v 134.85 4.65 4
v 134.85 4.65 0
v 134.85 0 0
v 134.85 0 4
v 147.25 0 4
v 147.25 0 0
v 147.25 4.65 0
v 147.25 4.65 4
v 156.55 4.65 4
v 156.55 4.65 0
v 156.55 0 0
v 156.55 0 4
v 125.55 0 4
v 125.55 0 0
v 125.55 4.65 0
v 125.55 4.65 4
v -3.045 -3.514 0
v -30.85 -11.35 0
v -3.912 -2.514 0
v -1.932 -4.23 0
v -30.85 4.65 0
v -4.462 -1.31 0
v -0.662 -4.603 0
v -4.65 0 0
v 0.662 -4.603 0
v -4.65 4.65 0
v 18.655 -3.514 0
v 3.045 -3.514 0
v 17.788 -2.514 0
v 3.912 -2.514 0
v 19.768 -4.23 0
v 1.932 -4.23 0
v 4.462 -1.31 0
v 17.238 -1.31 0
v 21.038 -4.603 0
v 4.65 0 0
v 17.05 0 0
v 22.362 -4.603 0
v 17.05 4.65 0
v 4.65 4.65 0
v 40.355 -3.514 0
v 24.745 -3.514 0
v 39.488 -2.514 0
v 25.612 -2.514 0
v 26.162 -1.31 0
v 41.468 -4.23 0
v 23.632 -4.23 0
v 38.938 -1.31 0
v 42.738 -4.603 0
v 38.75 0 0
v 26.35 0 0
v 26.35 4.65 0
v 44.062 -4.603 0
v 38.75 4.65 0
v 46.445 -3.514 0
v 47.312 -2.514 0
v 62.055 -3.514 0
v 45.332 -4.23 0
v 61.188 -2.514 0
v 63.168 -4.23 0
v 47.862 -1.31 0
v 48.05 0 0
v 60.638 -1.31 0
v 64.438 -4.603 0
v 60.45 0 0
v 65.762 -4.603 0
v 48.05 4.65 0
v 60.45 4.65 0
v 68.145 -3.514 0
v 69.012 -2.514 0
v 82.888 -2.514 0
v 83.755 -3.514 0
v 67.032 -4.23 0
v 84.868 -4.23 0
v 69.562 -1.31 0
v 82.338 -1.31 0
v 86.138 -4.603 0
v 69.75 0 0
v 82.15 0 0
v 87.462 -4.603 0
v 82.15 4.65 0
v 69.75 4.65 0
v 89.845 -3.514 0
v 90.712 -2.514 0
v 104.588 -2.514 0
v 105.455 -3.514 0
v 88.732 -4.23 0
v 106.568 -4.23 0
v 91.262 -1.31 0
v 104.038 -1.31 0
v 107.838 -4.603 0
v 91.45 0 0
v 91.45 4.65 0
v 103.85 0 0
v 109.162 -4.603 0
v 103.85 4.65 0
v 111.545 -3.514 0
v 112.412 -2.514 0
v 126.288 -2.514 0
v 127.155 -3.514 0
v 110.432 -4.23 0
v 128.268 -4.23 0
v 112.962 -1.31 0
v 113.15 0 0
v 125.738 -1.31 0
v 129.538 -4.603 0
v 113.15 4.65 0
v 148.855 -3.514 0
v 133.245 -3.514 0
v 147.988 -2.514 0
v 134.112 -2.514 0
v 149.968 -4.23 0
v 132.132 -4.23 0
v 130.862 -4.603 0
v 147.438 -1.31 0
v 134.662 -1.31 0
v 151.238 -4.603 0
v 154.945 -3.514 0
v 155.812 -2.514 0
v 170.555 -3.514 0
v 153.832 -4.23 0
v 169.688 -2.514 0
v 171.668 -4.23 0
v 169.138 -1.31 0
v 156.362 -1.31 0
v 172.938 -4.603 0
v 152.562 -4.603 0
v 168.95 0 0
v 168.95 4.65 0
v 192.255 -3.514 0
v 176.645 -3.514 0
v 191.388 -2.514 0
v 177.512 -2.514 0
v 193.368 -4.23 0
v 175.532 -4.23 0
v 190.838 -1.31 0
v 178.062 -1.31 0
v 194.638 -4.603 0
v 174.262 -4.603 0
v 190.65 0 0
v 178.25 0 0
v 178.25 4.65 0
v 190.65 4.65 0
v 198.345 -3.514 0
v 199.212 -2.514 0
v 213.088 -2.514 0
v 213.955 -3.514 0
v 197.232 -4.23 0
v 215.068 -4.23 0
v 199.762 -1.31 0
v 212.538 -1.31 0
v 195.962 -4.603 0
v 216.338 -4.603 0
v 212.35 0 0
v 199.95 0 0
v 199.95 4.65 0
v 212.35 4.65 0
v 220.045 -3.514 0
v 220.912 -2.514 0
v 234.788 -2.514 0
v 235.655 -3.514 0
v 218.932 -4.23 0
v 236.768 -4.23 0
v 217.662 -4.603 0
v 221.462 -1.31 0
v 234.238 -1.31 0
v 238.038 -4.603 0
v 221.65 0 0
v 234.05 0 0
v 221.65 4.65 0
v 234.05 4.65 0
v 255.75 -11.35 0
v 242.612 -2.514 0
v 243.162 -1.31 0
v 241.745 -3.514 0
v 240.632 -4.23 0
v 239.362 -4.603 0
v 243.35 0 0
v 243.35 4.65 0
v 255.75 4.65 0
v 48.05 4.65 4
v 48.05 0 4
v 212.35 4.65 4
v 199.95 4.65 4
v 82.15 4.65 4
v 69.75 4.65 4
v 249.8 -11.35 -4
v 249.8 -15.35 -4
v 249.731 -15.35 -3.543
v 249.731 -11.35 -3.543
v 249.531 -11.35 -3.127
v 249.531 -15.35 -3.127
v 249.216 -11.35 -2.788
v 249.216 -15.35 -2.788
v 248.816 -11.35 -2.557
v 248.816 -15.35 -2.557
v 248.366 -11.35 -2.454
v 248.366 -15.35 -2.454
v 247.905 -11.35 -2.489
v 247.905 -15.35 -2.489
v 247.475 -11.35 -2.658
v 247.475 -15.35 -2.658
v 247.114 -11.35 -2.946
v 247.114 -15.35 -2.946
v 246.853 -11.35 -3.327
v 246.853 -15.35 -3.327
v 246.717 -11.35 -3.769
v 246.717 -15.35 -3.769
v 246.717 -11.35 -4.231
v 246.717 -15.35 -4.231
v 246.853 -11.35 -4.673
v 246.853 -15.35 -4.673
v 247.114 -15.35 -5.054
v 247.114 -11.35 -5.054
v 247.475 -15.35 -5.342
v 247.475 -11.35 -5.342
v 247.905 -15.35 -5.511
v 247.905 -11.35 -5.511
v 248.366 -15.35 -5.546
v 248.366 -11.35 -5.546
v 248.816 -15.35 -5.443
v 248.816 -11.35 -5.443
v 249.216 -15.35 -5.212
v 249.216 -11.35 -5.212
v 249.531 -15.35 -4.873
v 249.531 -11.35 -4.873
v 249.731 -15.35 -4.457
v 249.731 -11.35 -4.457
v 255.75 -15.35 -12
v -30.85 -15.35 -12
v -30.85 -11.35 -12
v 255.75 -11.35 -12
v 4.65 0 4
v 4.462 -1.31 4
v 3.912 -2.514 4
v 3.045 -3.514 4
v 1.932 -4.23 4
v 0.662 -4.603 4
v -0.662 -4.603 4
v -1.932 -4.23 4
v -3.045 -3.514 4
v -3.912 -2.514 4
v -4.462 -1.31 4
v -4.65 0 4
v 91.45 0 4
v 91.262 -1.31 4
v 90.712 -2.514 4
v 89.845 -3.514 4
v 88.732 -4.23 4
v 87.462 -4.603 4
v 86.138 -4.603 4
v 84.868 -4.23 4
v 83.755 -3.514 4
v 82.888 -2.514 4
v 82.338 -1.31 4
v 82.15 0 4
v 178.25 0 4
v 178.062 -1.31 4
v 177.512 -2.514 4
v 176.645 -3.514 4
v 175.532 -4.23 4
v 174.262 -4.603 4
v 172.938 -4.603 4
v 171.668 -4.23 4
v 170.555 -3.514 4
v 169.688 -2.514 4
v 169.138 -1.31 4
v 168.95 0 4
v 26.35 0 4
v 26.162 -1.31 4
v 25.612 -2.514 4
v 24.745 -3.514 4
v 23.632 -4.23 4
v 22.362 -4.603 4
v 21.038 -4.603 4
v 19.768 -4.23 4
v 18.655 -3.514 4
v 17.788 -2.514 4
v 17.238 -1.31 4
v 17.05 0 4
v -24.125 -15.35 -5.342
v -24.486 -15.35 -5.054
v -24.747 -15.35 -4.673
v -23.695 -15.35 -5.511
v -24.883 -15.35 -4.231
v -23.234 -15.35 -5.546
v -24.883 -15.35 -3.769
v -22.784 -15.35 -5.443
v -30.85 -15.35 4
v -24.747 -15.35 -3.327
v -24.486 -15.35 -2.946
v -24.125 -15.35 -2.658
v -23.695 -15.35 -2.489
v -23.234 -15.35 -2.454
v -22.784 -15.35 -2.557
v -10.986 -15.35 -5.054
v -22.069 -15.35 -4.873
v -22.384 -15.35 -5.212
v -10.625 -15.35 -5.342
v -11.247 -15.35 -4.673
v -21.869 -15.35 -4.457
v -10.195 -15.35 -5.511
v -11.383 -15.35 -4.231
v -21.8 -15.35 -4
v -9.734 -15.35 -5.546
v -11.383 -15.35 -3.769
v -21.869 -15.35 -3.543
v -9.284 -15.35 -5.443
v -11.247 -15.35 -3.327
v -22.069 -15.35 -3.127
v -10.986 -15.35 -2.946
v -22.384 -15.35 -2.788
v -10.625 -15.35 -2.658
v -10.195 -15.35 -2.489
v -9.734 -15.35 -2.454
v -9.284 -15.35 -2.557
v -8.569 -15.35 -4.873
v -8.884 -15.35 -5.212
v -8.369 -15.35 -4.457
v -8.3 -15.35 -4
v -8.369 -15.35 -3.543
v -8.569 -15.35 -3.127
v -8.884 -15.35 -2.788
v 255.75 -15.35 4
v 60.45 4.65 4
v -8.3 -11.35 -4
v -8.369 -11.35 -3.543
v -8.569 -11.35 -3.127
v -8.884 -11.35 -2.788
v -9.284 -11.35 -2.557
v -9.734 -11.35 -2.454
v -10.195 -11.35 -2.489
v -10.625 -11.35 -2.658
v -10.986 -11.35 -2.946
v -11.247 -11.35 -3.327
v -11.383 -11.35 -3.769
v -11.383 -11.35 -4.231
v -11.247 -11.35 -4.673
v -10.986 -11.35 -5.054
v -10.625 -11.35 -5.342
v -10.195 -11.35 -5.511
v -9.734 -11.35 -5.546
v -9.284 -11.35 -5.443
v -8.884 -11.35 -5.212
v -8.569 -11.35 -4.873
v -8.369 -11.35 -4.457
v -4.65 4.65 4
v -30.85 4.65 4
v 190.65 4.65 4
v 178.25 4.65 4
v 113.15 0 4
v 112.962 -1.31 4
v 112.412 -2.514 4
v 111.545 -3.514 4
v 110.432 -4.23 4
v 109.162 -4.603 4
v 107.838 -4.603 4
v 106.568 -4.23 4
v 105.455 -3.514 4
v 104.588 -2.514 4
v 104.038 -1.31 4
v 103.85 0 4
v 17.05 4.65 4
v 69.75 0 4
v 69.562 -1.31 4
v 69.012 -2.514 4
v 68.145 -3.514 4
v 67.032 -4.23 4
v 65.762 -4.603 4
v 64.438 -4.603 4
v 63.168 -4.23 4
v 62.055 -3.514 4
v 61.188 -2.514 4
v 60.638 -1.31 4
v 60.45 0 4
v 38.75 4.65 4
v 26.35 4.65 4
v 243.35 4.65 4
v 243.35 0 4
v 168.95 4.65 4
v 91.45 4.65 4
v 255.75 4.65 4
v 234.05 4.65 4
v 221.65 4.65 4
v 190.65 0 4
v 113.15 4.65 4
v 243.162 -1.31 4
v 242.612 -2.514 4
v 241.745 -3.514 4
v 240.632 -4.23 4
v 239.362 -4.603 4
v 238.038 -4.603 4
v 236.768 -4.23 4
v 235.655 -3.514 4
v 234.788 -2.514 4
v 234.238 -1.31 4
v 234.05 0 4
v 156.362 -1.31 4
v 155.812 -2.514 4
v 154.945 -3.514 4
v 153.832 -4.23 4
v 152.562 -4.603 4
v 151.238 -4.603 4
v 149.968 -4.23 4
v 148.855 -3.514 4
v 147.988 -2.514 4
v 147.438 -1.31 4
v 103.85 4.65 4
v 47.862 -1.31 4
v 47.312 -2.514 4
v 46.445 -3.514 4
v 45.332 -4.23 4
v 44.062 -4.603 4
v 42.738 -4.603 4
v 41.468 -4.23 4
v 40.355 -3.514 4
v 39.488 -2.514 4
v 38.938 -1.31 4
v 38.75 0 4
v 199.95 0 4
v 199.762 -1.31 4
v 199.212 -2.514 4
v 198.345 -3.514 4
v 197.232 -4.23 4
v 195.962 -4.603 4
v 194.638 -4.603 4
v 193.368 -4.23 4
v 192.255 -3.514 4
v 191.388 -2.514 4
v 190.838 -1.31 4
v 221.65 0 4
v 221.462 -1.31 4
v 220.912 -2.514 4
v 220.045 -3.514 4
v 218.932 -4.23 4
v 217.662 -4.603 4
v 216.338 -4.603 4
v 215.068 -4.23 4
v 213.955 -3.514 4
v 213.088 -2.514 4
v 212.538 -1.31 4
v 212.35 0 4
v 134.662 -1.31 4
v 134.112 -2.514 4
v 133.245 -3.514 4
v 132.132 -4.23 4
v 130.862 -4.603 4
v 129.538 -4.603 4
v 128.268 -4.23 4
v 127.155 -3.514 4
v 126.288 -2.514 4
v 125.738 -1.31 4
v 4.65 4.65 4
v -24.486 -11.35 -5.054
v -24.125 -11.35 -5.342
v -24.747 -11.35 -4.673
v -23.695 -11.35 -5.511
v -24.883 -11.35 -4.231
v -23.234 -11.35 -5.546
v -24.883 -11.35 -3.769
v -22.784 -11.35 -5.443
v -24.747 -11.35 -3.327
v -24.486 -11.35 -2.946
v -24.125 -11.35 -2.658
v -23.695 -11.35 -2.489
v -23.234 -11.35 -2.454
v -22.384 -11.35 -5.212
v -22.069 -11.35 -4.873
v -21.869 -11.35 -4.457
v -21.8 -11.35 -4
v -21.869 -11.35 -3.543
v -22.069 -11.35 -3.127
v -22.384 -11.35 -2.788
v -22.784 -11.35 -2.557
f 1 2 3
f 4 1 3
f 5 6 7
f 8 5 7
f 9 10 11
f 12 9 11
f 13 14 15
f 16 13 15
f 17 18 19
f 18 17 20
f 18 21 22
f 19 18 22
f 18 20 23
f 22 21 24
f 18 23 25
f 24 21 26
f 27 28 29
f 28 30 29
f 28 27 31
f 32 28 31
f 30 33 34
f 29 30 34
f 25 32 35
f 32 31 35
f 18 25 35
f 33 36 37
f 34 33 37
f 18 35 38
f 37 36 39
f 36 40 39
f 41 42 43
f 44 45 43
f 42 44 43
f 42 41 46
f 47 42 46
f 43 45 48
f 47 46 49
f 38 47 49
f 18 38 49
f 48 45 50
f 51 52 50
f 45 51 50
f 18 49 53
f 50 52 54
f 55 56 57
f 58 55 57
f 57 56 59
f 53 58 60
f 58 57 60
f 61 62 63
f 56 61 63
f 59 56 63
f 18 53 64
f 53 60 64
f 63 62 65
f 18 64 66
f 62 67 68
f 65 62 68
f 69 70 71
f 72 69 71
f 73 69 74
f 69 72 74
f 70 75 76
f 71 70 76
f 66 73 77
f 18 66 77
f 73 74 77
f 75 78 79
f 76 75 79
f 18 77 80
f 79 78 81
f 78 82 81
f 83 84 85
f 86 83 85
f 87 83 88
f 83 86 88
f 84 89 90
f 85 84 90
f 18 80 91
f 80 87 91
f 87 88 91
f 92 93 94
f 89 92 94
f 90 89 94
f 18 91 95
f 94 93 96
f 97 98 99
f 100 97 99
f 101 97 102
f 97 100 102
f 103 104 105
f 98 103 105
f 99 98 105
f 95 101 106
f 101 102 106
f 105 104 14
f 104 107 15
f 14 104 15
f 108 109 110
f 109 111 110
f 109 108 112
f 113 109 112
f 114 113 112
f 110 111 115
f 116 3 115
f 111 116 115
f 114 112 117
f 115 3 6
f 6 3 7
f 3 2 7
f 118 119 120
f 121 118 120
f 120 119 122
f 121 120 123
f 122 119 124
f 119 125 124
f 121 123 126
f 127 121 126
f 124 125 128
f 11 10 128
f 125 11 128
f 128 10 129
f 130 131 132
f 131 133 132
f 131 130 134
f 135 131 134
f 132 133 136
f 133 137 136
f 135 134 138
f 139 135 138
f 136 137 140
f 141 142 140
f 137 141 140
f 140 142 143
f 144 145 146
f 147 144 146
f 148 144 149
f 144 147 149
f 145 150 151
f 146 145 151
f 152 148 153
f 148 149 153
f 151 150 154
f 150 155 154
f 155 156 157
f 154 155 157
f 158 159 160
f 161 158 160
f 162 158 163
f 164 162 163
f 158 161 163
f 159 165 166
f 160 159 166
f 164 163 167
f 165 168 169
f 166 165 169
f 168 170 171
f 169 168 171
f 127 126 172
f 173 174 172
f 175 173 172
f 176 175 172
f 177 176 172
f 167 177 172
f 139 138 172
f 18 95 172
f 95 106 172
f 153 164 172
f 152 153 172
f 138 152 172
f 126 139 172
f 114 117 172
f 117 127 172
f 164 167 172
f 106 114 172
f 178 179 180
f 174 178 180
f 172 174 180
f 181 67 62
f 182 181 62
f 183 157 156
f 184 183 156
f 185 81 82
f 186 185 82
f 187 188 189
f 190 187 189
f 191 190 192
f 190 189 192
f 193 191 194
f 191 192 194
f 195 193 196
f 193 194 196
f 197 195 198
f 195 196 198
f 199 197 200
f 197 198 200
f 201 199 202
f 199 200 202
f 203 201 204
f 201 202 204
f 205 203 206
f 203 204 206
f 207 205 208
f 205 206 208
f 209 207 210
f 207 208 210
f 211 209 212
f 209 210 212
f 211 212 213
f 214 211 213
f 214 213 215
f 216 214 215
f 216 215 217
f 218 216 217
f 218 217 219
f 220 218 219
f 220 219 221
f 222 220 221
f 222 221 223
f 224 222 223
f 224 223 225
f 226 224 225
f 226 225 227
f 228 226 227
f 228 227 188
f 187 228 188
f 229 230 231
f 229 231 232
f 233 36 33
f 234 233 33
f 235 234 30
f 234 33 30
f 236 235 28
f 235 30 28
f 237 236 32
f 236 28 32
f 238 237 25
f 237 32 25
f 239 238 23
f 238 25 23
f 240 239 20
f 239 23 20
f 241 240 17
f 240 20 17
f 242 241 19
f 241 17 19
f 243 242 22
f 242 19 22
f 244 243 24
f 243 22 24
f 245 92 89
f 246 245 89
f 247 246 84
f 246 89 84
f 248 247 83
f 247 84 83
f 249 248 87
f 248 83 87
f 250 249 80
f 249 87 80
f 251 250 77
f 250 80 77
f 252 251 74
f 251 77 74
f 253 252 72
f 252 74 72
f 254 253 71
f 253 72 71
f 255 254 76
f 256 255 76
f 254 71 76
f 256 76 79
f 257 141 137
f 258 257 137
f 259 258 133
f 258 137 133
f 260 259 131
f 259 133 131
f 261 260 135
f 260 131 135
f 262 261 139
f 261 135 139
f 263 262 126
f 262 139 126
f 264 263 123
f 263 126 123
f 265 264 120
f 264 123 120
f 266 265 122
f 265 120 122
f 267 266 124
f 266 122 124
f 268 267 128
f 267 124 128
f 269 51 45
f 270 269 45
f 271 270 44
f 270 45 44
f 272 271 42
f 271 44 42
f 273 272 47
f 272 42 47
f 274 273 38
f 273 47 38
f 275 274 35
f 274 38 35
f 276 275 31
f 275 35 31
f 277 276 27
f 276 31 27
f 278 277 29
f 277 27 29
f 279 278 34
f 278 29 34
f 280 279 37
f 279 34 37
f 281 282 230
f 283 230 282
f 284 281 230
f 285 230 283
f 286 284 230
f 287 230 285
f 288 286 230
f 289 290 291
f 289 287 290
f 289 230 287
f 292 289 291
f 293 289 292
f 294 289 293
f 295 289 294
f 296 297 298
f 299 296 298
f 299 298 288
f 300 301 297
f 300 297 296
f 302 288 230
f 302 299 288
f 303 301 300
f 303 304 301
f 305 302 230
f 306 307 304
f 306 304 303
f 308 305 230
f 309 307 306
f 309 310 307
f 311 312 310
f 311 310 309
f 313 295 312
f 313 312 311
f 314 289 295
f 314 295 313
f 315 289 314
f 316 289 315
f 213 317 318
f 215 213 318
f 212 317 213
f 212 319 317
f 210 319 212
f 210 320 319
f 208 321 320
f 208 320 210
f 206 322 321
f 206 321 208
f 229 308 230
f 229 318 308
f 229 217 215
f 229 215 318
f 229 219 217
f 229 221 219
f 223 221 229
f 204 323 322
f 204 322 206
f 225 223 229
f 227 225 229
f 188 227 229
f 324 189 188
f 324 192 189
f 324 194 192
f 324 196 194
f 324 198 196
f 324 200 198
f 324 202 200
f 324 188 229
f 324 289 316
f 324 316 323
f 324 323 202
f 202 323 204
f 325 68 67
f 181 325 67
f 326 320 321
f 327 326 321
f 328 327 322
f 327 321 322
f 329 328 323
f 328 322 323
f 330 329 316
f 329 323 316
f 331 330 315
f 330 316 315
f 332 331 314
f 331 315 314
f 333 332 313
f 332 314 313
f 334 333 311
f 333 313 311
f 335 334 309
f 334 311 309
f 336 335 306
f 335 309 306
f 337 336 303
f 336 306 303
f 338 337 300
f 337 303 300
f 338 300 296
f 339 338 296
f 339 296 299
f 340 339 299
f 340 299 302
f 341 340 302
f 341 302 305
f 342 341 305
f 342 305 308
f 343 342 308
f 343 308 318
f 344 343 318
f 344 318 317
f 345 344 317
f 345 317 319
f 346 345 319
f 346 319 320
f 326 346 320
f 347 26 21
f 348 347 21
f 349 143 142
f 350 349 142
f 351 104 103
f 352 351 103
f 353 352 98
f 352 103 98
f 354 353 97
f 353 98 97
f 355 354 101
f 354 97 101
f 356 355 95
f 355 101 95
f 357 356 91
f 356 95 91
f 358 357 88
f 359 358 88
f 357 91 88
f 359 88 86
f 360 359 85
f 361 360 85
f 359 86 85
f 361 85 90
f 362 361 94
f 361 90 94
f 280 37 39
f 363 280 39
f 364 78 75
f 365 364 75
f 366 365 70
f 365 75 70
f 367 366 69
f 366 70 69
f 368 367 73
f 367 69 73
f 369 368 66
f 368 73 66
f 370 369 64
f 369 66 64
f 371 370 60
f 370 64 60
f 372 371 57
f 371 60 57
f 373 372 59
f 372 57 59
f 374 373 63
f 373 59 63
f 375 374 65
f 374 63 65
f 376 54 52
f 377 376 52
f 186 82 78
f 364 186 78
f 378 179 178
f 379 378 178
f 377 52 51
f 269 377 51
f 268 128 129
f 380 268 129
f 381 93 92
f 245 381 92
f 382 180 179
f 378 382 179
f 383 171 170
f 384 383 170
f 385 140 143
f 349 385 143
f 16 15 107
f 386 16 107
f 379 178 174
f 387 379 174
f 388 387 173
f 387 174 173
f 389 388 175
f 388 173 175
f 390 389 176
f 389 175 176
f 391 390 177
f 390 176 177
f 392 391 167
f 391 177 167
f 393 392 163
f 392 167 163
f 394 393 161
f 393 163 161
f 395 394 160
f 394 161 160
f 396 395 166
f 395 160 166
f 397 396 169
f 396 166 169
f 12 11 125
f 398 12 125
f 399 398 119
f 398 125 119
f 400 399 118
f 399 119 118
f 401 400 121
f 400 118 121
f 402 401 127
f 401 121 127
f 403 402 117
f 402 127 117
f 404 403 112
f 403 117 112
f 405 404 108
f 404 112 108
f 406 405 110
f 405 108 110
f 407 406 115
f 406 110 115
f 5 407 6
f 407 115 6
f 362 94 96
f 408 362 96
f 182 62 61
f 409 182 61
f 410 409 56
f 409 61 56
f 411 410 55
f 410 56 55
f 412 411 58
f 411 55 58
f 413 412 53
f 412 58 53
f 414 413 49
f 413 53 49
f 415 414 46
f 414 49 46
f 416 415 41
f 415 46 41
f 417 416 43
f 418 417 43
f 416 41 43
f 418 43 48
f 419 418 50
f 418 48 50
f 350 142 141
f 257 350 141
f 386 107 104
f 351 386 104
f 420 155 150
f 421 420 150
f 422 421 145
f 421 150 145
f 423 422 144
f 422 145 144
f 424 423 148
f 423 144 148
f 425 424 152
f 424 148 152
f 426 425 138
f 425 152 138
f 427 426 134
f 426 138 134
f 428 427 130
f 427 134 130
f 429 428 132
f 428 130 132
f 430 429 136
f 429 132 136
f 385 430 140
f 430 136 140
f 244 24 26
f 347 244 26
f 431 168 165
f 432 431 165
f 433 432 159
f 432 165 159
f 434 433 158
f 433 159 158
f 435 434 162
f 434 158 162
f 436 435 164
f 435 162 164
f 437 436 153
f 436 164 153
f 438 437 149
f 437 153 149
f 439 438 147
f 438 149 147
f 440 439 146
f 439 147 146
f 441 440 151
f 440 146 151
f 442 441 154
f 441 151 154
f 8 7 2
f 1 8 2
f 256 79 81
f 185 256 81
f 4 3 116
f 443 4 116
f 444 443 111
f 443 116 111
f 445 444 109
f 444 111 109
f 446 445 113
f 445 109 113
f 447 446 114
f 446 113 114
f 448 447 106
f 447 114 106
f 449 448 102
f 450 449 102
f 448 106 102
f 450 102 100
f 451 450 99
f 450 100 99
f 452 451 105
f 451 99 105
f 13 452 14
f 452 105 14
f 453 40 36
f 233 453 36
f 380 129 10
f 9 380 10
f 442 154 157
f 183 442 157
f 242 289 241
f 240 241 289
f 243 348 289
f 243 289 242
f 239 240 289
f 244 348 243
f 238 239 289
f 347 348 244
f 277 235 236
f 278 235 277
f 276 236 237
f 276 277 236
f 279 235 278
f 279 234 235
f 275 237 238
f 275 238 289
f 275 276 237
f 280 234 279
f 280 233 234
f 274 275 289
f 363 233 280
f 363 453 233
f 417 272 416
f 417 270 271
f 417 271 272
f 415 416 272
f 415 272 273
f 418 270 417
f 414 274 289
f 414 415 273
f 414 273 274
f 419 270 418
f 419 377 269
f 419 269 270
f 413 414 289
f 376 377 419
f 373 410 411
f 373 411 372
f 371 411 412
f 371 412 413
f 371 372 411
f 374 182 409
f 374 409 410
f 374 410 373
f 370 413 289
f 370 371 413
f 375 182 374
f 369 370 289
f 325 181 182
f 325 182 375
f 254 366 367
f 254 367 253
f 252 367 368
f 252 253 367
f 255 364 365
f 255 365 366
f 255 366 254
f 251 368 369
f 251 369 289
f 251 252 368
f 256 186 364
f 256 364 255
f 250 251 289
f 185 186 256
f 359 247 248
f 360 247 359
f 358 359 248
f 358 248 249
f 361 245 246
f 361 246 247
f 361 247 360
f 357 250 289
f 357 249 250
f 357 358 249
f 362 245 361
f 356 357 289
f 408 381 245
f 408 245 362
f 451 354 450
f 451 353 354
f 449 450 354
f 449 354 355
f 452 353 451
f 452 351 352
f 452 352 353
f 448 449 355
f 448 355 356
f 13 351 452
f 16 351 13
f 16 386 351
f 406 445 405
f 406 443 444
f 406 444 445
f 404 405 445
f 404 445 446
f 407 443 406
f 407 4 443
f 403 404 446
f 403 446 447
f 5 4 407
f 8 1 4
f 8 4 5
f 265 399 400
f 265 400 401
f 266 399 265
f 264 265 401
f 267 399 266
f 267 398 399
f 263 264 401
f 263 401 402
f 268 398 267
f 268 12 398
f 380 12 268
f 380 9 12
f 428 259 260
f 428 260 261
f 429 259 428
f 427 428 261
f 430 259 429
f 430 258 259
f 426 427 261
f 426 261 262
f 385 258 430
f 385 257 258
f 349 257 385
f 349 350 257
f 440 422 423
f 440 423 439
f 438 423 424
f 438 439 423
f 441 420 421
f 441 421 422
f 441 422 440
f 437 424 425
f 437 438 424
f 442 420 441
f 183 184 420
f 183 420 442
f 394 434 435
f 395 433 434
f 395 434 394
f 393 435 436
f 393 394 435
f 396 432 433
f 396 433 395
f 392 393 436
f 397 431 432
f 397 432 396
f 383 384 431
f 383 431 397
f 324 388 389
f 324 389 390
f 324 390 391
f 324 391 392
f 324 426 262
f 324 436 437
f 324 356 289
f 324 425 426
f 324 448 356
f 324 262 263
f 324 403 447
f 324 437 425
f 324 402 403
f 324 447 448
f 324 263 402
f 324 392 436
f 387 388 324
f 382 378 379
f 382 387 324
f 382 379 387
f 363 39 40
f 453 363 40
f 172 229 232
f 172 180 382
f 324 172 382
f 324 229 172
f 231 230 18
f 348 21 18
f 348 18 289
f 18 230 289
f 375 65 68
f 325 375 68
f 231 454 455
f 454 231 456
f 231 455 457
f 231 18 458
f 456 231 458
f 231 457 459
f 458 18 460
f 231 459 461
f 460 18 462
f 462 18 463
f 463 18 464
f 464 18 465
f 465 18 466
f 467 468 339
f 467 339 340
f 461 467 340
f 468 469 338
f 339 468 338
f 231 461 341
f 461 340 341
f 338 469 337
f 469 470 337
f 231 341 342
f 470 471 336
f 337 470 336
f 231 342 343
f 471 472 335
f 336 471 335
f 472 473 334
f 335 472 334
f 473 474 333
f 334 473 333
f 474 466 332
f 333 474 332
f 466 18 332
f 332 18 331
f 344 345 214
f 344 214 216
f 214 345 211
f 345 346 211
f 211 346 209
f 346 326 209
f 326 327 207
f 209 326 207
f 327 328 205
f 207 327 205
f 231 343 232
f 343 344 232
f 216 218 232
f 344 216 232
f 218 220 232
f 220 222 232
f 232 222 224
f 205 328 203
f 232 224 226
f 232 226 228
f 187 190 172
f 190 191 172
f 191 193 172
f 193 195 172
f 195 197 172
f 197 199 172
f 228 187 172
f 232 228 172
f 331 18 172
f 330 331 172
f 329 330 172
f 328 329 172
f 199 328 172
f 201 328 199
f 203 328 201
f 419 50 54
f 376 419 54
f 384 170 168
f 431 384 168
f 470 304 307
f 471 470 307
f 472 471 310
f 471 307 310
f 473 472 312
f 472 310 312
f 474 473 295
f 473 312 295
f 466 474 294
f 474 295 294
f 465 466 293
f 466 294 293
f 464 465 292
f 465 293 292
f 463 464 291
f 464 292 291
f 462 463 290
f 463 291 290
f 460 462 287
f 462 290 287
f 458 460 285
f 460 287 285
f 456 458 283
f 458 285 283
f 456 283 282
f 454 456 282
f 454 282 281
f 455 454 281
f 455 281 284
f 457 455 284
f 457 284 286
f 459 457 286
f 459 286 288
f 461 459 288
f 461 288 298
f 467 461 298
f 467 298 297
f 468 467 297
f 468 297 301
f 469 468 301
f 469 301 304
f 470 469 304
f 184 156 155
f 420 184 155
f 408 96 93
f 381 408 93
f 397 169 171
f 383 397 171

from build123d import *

# Parameters (mm, degrees)
BOSS_EXTRUDE1_DEPTH = 4
SKETCH3_W           = 286.6
SKETCH3_H           = 12
BOSS_EXTRUDE2_DEPTH = 4
CUT_EXTRUDE1_REACH  = 258.811
SKETCH4_R           = 1.55


with BuildPart() as part:
    # Sketch1 → Boss-Extrude1 (new body)
    with BuildSketch(Plane.XY):
        with BuildLine():
            Line((-4.65, 0), (-4.65, 4.65))
            Line((-4.65, 4.65), (-30.85, 4.65))
            Line((-30.85, 4.65), (-30.85, -15.35))
            Line((-30.85, -15.35), (255.75, -15.35))
            Line((255.75, -15.35), (255.75, 4.65))
            Line((255.75, 4.65), (243.35, 4.65))
            Line((243.35, 4.65), (243.35, 0))
            ThreePointArc((243.35, 0), (238.7, -4.65), (234.05, 0))
            Line((234.05, 0), (234.05, 4.65))
            Line((234.05, 4.65), (221.65, 4.65))
            Line((221.65, 4.65), (221.65, 0))
            ThreePointArc((221.65, 0), (217, -4.65), (212.35, 0))
            Line((212.35, 0), (212.35, 4.65))
            Line((212.35, 4.65), (199.95, 4.65))
            Line((199.95, 4.65), (199.95, 0))
            ThreePointArc((199.95, 0), (195.3, -4.65), (190.65, 0))
            Line((190.65, 0), (190.65, 4.65))
            Line((190.65, 4.65), (178.25, 4.65))
            Line((178.25, 4.65), (178.25, 0))
            ThreePointArc((178.25, 0), (173.6, -4.65), (168.95, 0))
            Line((168.95, 0), (168.95, 4.65))
            Line((168.95, 4.65), (156.55, 4.65))
            Line((156.55, 4.65), (156.55, 0))
            ThreePointArc((156.55, 0), (151.9, -4.65), (147.25, 0))
            Line((147.25, 0), (147.25, 4.65))
            Line((147.25, 4.65), (134.85, 4.65))
            Line((134.85, 4.65), (134.85, 0))
            ThreePointArc((134.85, 0), (130.2, -4.65), (125.55, 0))
            Line((125.55, 0), (125.55, 4.65))
            Line((125.55, 4.65), (113.15, 4.65))
            Line((113.15, 4.65), (113.15, 0))
            ThreePointArc((113.15, 0), (108.5, -4.65), (103.85, 0))
            Line((103.85, 0), (103.85, 4.65))
            Line((103.85, 4.65), (91.45, 4.65))
            Line((91.45, 4.65), (91.45, 0))
            ThreePointArc((91.45, 0), (86.8, -4.65), (82.15, 0))
            Line((82.15, 0), (82.15, 4.65))
            Line((82.15, 4.65), (69.75, 4.65))
            Line((69.75, 4.65), (69.75, 0))
            ThreePointArc((69.75, 0), (65.1, -4.65), (60.45, 0))
            Line((60.45, 0), (60.45, 4.65))
            Line((60.45, 4.65), (48.05, 4.65))
            Line((48.05, 4.65), (48.05, 0))
            ThreePointArc((48.05, 0), (43.4, -4.65), (38.75, 0))
            Line((38.75, 0), (38.75, 4.65))
            Line((38.75, 4.65), (26.35, 4.65))
            Line((26.35, 4.65), (26.35, 0))
            ThreePointArc((26.35, 0), (21.7, -4.65), (17.05, 0))
            Line((17.05, 0), (17.05, 4.65))
            Line((17.05, 4.65), (4.65, 4.65))
            Line((4.65, 4.65), (4.65, 0))
            ThreePointArc((4.65, 0), (0, -4.65), (-4.65, 0))
        make_face()
    extrude(amount=BOSS_EXTRUDE1_DEPTH)

    # Sketch3 → Boss-Extrude2 (add)
    with BuildSketch(Plane.XZ.offset(15.35)):
        with Locations((112.45, -6)):
            Rectangle(SKETCH3_W, SKETCH3_H)
    extrude(amount=-BOSS_EXTRUDE2_DEPTH)

    # Sketch4 → Cut-Extrude1 (cut, up to next)
    with BuildSketch(Plane.XZ.offset(15.35), mode=Mode.PRIVATE) as cut_extrude1_sk1:
        with Locations((-23.35, -4)):
            Circle(SKETCH4_R)
    cut_extrude1_tool1 = extrude(cut_extrude1_sk1.sketch, amount=-CUT_EXTRUDE1_REACH, mode=Mode.PRIVATE) & part.part
    # Sketch4 → Cut-Extrude1 (cut, up to next)
    with BuildSketch(Plane.XZ.offset(15.35), mode=Mode.PRIVATE) as cut_extrude1_sk2:
        with Locations((248.25, -4)):
            Circle(SKETCH4_R)
    cut_extrude1_tool2 = extrude(cut_extrude1_sk2.sketch, amount=-CUT_EXTRUDE1_REACH, mode=Mode.PRIVATE) & part.part
    # Sketch4 → Cut-Extrude1 (cut, up to next)
    with BuildSketch(Plane.XZ.offset(15.35), mode=Mode.PRIVATE) as cut_extrude1_sk3:
        with Locations((-9.85, -4)):
            Circle(SKETCH4_R)
    cut_extrude1_tool3 = extrude(cut_extrude1_sk3.sketch, amount=-CUT_EXTRUDE1_REACH, mode=Mode.PRIVATE) & part.part
    add(cut_extrude1_tool1.solids().sort_by_distance((-23.35, -15.35, -4))[0], mode=Mode.SUBTRACT)
    add(cut_extrude1_tool2.solids().sort_by_distance((248.25, -15.35, -4))[0], mode=Mode.SUBTRACT)
    add(cut_extrude1_tool3.solids().sort_by_distance((-9.85, -15.35, -4))[0], mode=Mode.SUBTRACT)


solid = part.part
